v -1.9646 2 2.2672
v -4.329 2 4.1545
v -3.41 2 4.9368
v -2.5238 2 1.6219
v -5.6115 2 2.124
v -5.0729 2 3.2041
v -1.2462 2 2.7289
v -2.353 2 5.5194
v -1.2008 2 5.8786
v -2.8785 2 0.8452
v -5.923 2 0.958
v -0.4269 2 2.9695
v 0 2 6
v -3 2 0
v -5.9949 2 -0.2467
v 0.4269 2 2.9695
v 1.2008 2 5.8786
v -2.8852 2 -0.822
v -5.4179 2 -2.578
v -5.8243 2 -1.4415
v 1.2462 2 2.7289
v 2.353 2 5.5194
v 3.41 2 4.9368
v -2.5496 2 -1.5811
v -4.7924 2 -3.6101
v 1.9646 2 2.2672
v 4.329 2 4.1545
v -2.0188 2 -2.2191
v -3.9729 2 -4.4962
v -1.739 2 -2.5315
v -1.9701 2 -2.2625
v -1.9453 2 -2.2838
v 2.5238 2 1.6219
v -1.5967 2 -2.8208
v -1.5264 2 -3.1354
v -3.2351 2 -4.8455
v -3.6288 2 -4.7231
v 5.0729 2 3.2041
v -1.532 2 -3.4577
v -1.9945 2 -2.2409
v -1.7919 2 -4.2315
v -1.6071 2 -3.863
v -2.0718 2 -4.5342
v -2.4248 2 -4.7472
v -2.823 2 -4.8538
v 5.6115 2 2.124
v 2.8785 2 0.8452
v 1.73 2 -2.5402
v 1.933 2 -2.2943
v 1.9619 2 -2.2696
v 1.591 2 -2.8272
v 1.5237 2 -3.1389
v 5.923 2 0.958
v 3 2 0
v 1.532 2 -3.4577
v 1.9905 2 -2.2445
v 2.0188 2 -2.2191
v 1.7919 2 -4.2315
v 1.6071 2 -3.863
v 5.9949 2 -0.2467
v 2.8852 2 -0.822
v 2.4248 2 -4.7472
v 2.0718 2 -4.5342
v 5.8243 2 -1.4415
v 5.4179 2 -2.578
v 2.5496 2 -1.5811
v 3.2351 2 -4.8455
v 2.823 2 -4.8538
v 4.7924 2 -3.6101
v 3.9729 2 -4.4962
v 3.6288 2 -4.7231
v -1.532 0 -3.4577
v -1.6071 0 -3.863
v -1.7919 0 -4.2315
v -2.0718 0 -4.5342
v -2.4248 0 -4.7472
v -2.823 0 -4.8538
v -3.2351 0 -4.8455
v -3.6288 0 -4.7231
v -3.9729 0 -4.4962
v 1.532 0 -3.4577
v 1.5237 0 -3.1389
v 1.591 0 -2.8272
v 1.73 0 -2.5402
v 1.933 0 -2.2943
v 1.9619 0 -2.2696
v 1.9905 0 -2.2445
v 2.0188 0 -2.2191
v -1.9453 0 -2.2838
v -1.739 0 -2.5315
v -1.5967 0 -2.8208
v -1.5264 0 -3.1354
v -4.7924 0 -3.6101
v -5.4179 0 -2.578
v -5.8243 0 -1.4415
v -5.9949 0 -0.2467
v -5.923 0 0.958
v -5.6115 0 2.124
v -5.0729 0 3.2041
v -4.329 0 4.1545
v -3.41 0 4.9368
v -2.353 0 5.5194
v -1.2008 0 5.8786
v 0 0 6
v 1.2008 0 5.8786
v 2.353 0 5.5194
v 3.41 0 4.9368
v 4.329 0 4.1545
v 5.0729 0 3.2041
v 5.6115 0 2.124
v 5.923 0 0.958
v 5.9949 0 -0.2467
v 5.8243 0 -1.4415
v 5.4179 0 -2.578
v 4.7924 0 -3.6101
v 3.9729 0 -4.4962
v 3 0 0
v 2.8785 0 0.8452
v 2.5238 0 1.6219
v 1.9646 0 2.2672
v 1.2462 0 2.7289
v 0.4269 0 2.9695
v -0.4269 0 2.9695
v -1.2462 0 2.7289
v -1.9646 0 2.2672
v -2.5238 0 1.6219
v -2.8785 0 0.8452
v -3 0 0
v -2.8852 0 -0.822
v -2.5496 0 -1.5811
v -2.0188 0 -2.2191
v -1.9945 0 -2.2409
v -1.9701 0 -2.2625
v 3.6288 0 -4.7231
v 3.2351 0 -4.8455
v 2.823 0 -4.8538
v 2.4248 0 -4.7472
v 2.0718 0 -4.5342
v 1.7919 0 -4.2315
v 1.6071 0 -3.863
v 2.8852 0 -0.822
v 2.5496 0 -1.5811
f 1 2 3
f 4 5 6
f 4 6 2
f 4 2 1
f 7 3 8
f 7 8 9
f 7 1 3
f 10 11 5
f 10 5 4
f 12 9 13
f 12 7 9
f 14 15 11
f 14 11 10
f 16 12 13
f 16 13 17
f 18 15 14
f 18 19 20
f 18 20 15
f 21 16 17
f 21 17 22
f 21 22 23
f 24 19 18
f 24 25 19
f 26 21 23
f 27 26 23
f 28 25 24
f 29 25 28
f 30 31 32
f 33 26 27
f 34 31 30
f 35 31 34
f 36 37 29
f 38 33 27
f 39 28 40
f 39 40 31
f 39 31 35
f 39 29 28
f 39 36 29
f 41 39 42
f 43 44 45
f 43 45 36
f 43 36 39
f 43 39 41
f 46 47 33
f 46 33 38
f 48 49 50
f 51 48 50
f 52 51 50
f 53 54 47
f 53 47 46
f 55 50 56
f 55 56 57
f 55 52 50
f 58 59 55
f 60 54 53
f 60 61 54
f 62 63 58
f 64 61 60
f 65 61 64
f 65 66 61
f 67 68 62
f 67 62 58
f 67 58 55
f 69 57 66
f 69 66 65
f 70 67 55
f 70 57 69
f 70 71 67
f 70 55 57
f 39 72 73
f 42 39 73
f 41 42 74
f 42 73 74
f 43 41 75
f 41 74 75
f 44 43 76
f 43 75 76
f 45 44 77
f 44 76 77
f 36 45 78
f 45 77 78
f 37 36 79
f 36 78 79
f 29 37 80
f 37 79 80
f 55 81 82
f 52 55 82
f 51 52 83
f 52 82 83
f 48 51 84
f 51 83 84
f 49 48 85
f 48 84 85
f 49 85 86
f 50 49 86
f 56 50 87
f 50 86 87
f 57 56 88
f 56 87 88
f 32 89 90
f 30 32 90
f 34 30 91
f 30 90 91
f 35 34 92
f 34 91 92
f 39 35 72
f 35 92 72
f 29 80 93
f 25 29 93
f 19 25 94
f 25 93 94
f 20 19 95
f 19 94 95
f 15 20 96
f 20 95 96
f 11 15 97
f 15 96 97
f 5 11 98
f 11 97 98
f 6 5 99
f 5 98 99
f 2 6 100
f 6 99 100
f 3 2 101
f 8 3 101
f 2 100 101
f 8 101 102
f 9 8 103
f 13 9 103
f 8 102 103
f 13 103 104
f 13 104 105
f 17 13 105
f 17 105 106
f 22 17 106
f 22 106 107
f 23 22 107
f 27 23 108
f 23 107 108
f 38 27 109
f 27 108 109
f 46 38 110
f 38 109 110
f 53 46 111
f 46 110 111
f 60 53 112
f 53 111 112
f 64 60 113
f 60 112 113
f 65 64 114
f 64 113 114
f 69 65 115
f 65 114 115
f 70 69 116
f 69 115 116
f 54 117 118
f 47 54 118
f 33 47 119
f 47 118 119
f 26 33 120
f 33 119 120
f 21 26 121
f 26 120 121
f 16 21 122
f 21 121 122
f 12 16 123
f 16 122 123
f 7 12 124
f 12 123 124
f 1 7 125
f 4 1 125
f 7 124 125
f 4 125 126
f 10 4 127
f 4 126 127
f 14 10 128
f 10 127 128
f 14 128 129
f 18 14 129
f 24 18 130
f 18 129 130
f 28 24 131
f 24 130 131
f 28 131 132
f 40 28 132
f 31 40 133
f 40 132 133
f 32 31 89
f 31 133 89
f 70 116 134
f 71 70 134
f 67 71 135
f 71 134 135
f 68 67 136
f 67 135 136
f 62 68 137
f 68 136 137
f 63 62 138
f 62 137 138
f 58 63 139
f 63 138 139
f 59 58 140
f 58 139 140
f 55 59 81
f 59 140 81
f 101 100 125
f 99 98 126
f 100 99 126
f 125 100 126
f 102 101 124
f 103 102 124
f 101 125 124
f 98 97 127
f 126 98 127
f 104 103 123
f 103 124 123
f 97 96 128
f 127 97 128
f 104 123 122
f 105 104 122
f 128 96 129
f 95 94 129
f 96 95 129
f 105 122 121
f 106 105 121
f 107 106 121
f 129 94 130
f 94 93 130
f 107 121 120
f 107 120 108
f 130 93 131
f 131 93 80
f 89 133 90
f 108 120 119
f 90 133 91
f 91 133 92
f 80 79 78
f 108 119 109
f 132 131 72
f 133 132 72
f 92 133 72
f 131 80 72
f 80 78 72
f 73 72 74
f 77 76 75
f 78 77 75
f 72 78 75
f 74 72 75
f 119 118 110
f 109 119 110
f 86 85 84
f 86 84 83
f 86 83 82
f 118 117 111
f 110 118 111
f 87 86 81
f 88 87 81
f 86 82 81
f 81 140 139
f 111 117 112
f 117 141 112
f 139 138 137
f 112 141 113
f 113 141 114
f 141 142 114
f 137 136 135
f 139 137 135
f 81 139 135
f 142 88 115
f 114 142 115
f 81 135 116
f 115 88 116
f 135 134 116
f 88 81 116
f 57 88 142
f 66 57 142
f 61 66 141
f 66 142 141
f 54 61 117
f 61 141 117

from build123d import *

# Parameters (mm, degrees)
BOSS_EXTRUDE1_DEPTH = 2


with BuildPart() as part:
    # Sketch1 → Boss-Extrude1 (new body)
    with BuildSketch(Plane(origin=(0, 0, 0), x_dir=(1, 0, 0), z_dir=(0, 1, 0))):
        with BuildLine():
            ThreePointArc((3, 0), (0, -3), (-3, 0))
            ThreePointArc((-3, 0), (-2.743755194, 1.213180711), (-2.018795042, 2.219113918))
            ThreePointArc((-2.018795042, 2.219113918), (-1.982332969, 2.251745101), (-1.945343535, 2.283777251))
            ThreePointArc((-1.945343535, 2.283777251), (-1.596748035, 2.82076449), (-1.5319755, 3.457693556))
            ThreePointArc((-1.5319755, 3.457693556), (-2.424767696, 4.747181988), (-3.972947107, 4.496186305))
            ThreePointArc((-3.972947107, 4.496186305), (0, -6), (3.972947107, 4.496186305))
            ThreePointArc((3.972947107, 4.496186305), (2.424767696, 4.747181988), (1.5319755, 3.457693556))
            ThreePointArc((1.5319755, 3.457693556), (1.590995928, 2.827214748), (1.932969653, 2.294259864))
            ThreePointArc((1.932969653, 2.294259864), (1.976239555, 2.257094863), (2.018795042, 2.219113918))
            ThreePointArc((2.018795042, 2.219113918), (2.743755194, 1.213180711), (3, 0))
        make_face()
    extrude(amount=BOSS_EXTRUDE1_DEPTH)


solid = part.part
